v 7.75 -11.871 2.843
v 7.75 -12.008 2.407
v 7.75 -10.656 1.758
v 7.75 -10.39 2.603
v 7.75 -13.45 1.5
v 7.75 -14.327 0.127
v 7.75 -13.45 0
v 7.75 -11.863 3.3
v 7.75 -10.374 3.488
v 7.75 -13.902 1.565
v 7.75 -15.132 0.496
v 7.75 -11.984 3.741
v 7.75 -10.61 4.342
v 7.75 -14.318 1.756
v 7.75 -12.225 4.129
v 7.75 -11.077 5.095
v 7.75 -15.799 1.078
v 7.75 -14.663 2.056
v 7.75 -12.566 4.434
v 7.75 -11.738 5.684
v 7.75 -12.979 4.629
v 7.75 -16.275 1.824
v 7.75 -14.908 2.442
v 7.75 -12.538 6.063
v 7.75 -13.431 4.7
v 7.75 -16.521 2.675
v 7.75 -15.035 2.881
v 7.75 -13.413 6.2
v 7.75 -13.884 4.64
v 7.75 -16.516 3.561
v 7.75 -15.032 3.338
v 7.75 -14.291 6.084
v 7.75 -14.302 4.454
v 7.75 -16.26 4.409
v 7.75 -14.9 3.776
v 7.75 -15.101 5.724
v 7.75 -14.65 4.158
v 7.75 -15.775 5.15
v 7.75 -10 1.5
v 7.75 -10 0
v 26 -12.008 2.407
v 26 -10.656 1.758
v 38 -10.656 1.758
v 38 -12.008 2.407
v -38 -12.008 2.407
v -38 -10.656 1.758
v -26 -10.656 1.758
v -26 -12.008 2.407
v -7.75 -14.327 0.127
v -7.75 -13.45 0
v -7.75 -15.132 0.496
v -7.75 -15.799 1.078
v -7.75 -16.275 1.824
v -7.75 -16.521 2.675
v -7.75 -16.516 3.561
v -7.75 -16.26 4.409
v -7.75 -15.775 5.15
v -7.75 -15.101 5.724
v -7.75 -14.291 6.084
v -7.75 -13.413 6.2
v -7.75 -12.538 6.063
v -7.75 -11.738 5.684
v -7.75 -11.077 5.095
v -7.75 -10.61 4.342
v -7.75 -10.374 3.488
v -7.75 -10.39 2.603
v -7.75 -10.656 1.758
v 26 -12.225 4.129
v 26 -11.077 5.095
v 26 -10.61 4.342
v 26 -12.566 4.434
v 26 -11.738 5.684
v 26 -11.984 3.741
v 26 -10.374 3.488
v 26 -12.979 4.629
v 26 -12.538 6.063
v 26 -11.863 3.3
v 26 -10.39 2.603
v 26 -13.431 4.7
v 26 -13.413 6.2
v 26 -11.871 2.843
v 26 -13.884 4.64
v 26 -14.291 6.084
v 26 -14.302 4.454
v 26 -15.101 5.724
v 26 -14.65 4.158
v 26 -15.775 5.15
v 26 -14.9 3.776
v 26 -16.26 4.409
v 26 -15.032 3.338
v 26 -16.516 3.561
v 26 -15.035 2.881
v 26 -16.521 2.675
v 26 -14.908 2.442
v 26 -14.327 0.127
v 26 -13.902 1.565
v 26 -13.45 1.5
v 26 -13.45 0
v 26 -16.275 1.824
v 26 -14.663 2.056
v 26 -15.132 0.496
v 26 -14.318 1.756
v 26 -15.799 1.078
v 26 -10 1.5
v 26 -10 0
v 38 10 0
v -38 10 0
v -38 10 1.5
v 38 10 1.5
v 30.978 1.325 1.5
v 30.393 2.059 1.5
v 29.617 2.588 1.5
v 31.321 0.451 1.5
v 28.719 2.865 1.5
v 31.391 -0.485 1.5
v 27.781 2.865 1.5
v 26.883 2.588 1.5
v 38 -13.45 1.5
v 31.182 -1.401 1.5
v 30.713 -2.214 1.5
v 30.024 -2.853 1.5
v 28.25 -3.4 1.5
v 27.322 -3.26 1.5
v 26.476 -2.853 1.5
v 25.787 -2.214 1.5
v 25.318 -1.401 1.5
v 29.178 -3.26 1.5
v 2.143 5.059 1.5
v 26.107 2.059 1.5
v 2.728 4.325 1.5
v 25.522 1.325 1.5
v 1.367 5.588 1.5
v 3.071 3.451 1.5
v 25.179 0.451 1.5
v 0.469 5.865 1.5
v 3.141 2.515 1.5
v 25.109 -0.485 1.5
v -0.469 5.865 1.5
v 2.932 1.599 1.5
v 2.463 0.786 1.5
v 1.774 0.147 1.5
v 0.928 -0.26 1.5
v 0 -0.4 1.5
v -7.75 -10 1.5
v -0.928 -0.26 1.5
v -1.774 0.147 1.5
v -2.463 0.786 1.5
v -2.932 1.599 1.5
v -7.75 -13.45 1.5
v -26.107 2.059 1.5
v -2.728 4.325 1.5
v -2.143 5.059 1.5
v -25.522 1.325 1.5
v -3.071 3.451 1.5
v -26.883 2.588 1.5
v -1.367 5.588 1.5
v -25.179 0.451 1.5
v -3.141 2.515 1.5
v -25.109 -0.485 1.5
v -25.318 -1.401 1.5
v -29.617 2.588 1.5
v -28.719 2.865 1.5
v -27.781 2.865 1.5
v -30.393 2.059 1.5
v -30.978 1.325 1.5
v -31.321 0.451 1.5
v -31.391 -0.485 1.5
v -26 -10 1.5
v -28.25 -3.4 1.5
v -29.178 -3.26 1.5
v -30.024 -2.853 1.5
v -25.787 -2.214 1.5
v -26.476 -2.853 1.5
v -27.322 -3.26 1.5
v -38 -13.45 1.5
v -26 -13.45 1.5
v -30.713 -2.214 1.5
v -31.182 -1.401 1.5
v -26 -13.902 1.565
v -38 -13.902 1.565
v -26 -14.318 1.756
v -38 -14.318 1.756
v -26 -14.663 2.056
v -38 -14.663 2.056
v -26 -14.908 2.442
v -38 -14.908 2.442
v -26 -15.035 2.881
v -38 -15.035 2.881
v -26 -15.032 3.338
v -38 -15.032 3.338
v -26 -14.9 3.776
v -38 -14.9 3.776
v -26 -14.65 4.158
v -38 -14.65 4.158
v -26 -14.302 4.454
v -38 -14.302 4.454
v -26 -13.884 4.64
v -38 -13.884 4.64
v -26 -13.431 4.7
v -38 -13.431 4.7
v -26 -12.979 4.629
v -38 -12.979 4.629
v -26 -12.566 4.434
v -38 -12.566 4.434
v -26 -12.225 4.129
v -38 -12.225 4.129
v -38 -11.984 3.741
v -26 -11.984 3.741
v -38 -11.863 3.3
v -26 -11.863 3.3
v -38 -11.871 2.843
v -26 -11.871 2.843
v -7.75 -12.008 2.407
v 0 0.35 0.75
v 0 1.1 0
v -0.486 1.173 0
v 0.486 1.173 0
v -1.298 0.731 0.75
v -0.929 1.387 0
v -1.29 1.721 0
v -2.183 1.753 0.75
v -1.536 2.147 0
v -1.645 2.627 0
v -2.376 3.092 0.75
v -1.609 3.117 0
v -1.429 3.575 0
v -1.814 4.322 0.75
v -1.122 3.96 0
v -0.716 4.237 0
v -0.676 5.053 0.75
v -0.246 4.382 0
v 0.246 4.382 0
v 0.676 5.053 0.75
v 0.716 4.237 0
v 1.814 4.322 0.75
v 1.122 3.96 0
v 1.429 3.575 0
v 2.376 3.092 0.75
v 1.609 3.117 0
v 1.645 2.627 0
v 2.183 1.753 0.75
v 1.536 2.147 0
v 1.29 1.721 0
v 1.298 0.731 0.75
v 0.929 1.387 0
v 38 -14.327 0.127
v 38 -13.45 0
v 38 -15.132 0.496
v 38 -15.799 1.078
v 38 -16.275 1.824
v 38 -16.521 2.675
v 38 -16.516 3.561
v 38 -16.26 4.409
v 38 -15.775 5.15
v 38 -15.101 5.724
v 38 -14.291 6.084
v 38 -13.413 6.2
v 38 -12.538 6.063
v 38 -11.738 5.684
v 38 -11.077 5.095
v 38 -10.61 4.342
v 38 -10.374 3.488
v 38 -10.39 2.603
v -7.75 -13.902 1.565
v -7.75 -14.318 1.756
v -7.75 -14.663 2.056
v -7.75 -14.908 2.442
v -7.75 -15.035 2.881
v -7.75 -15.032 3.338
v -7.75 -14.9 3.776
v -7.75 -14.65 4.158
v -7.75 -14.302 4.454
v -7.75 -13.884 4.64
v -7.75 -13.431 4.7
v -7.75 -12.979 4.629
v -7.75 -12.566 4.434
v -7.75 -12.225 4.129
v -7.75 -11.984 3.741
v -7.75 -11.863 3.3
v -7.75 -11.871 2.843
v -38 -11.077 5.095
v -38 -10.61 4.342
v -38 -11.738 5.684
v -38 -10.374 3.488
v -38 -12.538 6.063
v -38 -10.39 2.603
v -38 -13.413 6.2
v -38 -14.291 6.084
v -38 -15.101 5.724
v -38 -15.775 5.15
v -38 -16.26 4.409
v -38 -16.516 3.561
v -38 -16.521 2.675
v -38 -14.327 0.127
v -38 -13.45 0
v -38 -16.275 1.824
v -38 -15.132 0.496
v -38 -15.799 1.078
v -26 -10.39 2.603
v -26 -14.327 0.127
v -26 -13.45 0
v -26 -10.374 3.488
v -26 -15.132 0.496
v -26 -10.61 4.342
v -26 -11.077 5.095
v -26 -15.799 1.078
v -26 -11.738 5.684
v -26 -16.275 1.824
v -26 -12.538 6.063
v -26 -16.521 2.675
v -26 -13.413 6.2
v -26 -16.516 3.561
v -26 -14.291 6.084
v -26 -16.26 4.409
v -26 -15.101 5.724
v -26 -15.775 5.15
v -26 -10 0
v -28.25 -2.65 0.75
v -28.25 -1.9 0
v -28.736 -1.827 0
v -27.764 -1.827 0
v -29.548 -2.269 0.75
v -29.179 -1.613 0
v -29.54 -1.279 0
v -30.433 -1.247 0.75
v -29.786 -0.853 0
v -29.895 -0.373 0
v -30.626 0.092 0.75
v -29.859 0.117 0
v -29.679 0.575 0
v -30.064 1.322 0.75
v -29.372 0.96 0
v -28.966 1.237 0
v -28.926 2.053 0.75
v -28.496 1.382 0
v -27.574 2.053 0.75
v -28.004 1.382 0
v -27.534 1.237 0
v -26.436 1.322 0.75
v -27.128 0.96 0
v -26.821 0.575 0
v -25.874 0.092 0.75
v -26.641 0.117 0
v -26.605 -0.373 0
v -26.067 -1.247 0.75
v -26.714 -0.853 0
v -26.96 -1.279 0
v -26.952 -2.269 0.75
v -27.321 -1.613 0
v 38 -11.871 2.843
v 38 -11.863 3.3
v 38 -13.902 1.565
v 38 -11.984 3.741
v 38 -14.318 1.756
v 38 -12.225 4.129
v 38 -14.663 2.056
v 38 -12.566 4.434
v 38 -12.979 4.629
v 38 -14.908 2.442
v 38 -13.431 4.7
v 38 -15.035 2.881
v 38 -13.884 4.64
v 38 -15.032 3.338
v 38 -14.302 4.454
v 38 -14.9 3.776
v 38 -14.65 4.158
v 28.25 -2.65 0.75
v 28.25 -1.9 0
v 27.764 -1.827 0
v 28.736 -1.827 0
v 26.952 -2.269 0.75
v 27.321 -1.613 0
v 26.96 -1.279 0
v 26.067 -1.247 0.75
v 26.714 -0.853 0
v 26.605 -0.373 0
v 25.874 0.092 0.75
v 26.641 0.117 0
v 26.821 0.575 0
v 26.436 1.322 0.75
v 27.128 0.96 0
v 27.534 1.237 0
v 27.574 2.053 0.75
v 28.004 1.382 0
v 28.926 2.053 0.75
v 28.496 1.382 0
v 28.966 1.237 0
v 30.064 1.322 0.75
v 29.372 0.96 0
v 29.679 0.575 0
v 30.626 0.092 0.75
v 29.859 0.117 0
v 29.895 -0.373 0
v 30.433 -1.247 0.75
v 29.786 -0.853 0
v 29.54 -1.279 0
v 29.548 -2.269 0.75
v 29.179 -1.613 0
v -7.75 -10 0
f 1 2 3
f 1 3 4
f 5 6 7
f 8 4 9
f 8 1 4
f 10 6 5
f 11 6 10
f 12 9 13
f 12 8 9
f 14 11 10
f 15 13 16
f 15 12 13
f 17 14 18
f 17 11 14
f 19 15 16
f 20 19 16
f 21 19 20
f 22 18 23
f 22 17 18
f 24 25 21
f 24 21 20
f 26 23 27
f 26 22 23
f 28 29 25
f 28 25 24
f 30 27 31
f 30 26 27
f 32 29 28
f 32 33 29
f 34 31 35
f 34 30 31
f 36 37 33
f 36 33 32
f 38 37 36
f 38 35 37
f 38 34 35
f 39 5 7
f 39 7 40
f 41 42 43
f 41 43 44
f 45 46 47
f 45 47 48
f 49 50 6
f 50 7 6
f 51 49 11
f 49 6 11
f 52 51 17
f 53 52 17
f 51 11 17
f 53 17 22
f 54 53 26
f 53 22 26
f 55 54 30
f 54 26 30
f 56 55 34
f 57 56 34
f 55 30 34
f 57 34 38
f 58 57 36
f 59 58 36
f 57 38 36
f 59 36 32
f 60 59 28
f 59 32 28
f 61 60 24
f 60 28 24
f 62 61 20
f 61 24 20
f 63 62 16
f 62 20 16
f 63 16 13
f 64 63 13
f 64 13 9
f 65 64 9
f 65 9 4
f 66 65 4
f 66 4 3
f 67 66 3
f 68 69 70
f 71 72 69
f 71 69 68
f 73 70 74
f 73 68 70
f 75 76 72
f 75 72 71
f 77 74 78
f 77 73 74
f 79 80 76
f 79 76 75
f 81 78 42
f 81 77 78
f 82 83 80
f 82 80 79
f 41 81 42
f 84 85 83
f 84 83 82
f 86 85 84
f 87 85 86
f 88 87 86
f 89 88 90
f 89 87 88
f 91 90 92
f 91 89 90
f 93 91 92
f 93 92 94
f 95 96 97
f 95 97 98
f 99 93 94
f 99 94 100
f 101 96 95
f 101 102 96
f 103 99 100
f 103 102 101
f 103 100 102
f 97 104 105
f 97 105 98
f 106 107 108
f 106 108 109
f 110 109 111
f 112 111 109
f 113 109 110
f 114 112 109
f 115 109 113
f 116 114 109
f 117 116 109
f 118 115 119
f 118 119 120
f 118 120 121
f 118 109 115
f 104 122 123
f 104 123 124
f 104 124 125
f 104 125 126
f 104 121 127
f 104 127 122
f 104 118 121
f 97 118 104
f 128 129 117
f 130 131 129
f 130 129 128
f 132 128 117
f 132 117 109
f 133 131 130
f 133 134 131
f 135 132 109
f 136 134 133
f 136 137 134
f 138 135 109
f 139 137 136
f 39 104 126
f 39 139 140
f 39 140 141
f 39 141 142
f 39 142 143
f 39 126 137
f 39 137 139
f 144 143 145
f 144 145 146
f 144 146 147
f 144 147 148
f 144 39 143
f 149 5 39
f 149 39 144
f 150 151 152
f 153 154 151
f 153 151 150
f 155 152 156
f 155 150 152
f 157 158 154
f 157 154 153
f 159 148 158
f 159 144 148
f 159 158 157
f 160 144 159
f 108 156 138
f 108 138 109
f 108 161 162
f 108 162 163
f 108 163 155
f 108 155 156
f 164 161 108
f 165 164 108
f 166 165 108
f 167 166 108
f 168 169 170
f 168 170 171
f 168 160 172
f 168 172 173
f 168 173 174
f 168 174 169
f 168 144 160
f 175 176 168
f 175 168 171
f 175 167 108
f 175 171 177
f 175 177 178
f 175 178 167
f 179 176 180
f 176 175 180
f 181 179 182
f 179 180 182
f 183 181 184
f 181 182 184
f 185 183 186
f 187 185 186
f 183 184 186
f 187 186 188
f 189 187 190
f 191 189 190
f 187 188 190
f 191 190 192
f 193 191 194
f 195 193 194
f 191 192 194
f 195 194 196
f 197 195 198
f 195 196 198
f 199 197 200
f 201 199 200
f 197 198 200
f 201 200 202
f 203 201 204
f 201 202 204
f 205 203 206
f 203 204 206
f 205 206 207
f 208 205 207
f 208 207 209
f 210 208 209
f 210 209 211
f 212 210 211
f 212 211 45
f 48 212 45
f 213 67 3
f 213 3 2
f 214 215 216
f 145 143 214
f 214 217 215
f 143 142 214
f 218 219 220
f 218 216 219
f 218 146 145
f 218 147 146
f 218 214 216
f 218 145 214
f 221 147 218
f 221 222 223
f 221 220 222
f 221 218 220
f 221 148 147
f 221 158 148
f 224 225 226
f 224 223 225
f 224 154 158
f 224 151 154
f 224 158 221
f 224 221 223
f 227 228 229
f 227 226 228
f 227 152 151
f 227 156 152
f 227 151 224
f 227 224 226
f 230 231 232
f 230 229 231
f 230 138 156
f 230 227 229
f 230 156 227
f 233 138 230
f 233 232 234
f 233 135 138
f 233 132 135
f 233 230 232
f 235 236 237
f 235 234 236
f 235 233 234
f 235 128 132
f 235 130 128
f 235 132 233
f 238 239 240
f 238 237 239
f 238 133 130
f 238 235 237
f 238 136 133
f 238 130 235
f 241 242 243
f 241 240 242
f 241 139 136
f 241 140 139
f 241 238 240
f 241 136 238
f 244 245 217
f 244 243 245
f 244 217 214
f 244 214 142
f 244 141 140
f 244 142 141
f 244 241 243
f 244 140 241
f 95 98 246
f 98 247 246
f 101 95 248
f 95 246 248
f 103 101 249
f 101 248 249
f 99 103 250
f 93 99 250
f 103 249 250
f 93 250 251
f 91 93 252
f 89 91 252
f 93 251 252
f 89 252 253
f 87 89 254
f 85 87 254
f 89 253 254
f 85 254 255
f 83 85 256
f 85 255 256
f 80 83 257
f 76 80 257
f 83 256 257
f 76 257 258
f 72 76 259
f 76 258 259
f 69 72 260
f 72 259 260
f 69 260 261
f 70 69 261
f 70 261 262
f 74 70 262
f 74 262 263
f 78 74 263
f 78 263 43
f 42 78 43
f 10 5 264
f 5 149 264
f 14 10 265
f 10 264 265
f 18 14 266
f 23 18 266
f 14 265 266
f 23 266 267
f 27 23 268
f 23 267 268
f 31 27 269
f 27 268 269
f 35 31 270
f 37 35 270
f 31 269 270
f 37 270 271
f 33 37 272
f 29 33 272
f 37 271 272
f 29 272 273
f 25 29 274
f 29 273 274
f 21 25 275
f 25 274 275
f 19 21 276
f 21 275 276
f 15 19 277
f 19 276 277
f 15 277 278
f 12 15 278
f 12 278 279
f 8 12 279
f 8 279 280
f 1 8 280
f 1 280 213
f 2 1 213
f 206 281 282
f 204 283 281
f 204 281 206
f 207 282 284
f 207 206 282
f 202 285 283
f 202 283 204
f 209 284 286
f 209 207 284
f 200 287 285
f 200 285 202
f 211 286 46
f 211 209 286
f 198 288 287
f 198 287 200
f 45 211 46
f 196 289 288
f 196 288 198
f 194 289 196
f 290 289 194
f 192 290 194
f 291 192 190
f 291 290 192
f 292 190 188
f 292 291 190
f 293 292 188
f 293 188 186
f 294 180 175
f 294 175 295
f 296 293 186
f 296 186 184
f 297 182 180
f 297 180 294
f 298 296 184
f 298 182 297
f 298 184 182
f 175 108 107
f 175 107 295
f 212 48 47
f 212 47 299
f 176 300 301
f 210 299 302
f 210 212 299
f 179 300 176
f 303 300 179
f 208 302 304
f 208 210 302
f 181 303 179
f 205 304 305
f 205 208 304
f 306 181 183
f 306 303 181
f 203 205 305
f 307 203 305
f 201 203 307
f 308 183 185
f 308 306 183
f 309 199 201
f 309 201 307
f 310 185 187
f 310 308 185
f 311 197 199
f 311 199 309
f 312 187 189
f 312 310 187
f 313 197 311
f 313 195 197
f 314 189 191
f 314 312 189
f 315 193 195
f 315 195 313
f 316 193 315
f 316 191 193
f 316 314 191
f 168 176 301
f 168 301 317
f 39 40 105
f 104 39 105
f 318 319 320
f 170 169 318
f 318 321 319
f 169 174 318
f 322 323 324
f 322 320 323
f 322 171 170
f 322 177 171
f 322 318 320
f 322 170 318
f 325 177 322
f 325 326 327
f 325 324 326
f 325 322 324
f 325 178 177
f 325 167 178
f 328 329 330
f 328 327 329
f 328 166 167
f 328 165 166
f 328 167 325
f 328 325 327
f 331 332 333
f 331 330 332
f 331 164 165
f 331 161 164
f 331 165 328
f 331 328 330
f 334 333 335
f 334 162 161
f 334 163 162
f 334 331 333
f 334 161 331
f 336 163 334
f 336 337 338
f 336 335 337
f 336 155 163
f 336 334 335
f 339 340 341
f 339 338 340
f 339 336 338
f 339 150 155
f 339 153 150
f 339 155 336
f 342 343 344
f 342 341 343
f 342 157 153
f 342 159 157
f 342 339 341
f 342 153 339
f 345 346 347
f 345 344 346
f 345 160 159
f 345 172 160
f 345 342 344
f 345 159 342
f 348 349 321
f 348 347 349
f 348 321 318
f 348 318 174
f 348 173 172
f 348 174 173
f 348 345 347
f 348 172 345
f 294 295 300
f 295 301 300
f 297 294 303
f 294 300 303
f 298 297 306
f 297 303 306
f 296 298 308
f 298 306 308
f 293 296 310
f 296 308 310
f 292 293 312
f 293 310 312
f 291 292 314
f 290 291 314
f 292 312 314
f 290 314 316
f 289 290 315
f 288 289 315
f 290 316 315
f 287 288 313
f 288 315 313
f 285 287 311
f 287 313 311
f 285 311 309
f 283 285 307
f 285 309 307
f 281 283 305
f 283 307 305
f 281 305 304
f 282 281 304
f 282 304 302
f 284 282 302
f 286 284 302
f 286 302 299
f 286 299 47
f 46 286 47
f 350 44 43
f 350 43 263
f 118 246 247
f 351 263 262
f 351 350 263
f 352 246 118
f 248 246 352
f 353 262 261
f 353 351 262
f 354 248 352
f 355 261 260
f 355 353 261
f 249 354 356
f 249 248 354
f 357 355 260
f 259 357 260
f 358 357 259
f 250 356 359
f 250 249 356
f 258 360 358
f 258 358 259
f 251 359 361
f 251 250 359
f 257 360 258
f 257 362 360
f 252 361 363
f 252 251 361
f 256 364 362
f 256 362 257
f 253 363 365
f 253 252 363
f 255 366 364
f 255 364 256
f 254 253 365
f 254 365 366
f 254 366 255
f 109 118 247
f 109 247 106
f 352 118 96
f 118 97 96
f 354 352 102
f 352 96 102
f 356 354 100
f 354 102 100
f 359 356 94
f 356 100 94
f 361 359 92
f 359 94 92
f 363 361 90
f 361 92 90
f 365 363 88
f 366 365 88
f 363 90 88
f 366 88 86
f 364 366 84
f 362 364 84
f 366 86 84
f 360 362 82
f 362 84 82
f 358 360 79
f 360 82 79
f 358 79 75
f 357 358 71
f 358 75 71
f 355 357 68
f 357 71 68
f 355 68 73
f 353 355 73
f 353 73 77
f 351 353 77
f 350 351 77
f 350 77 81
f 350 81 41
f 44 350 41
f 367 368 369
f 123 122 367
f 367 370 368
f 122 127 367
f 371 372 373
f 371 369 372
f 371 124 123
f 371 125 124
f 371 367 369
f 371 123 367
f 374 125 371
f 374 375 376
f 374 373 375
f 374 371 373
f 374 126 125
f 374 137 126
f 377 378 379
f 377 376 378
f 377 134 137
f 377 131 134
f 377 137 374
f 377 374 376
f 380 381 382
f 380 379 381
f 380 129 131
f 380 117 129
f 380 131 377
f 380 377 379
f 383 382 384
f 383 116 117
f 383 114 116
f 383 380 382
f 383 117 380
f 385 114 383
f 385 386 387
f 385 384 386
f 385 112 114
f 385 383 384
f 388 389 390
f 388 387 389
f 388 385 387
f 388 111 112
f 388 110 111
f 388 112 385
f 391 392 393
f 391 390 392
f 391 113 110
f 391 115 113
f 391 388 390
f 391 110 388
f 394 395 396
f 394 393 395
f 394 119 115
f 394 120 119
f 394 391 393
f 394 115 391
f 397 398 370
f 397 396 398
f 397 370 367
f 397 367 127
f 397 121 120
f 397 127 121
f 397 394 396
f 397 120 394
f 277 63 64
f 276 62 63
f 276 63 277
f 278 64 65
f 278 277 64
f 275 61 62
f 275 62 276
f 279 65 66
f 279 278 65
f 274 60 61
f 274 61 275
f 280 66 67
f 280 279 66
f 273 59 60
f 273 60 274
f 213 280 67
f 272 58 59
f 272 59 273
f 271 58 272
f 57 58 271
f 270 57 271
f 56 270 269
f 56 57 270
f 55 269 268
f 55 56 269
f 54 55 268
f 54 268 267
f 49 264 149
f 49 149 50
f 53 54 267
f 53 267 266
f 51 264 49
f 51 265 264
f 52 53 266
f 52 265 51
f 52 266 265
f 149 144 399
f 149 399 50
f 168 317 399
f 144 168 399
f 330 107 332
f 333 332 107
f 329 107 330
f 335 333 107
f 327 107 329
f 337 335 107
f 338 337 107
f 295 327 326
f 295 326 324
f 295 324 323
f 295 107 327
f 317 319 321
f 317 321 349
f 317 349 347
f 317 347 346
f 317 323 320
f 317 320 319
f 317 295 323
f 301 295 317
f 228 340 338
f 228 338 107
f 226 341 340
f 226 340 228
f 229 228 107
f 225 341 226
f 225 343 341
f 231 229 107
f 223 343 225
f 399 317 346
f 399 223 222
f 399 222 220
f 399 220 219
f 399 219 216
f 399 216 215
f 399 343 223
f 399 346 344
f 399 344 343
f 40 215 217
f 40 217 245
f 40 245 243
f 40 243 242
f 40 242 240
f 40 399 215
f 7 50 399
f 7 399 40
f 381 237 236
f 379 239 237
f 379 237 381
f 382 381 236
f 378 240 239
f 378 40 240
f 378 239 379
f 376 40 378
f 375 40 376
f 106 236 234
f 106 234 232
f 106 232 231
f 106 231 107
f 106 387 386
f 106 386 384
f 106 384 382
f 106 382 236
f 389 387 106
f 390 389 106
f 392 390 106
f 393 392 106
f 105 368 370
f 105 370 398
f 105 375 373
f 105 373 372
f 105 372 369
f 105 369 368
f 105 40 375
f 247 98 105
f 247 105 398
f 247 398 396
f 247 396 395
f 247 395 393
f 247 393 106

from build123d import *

# Parameters (mm, degrees)
SKETCH1_W                                    = 76
SKETCH1_H                                    = 20
EXTRUDE1_DEPTH                               = 1.5
SKETCH3_W                                    = 15.5
SKETCH3_H                                    = 1.5
SKETCH4_W                                    = 12
SKETCH4_H                                    = 1.5
SKETCH2_W                                    = 12
SKETCH2_H                                    = 1.5
CSK_FOR_M3_COUNTERSUNK_FLAT_HEAD_SCR_2_COUNT = 2
CSK_FOR_M3_COUNTERSUNK_FLAT_HEAD_SCR_2_PITCH = 28.408845453
CSK_FOR_M3_COUNTERSUNK_FLAT_HEAD_SCR_3_COUNT = 2
CSK_FOR_M3_COUNTERSUNK_FLAT_HEAD_SCR_3_PITCH = 56.5


with BuildPart() as part:
    # Sketch1 → Extrude1 (new body)
    with BuildSketch(Plane.XY):
        Rectangle(SKETCH1_W, SKETCH1_H)
    extrude(amount=EXTRUDE1_DEPTH)

    # Sweep1: sweep along a path in Sketch5
    with BuildLine(Plane(origin=(0, 0, 0), x_dir=(0, 0, -1), z_dir=(1, 0, 0))) as sweep1_path:
        Line((-0.75, -10), (-0.75, -13.45))
        ThreePointArc((-0.75, -13.45), (-5.089163608, -14.70129059), (-2.082534588, -11.331683655))
    # Sketch3 → Sweep1 (sweep)
    with BuildSketch(Plane.XZ.offset(10)):
        with Locations((0, 0.75)):
            Rectangle(SKETCH3_W, SKETCH3_H)
    sweep(path=sweep1_path.line)

    # Sweep2: sweep along a path in Sketch7
    with BuildLine(Plane(origin=(32, 0, 0), x_dir=(0, 0, -1), z_dir=(1, 0, 0))) as sweep2_path:
        Line((-0.75, -10), (-0.75, -13.45))
        ThreePointArc((-0.75, -13.45), (-5.089163608, -14.70129059), (-2.082534588, -11.331683655))
    # Sketch4 → Sweep2 (sweep)
    with BuildSketch(Plane.XZ.offset(10)):
        with Locations((32, 0.75)):
            Rectangle(SKETCH4_W, SKETCH4_H)
    sweep(path=sweep2_path.line)

    # Sweep3: sweep along a path in Sketch6
    with BuildLine(Plane(origin=(-32, 0, 0), x_dir=(0, 0, -1), z_dir=(1, 0, 0))) as sweep3_path:
        Line((-0.75, -10), (-0.75, -13.45))
        ThreePointArc((-0.75, -13.45), (-5.089163608, -14.70129059), (-2.082534588, -11.331683655))
    # Sketch2 → Sweep3 (sweep)
    with BuildSketch(Plane.XZ.offset(10)):
        with Locations((-32, 0.75)):
            Rectangle(SKETCH2_W, SKETCH2_H)
    sweep(path=sweep3_path.line)

    # Sketch9 → CSK for M3 Countersunk Flat Head Screw1 (revolve, cut)
    with BuildSketch(Plane(origin=(28.25, -0.25, 1.5), x_dir=(0, -1, 0), z_dir=(1, 0, 0))):
        Polygon((0, 0), (0, 1.50005), (1.6, 1.50005), (1.6, 1.55), (3.15, 0), align=None)
    csk_for_m3_countersunk_flat_head_screw1 = revolve(axis=Axis((28.25, -0.25, 7.85), (0, 0, -1)), mode=Mode.SUBTRACT)

    # CSK for M3 Countersunk Flat Head Scr 2: CSK for M3 Countersunk Flat Head Screw1 ×2
    with Locations(*[Vector(-0.994408591727349, 0.10560091239582468, 0) * (i * CSK_FOR_M3_COUNTERSUNK_FLAT_HEAD_SCR_2_PITCH) for i in range(1, CSK_FOR_M3_COUNTERSUNK_FLAT_HEAD_SCR_2_COUNT)]):
        add(csk_for_m3_countersunk_flat_head_screw1, mode=Mode.SUBTRACT)

    # CSK for M3 Countersunk Flat Head Scr 3: CSK for M3 Countersunk Flat Head Screw1 ×2
    with Locations(*[(-i * CSK_FOR_M3_COUNTERSUNK_FLAT_HEAD_SCR_3_PITCH, 0, 0) for i in range(1, CSK_FOR_M3_COUNTERSUNK_FLAT_HEAD_SCR_3_COUNT)]):
        add(csk_for_m3_countersunk_flat_head_screw1, mode=Mode.SUBTRACT)


solid = part.part
